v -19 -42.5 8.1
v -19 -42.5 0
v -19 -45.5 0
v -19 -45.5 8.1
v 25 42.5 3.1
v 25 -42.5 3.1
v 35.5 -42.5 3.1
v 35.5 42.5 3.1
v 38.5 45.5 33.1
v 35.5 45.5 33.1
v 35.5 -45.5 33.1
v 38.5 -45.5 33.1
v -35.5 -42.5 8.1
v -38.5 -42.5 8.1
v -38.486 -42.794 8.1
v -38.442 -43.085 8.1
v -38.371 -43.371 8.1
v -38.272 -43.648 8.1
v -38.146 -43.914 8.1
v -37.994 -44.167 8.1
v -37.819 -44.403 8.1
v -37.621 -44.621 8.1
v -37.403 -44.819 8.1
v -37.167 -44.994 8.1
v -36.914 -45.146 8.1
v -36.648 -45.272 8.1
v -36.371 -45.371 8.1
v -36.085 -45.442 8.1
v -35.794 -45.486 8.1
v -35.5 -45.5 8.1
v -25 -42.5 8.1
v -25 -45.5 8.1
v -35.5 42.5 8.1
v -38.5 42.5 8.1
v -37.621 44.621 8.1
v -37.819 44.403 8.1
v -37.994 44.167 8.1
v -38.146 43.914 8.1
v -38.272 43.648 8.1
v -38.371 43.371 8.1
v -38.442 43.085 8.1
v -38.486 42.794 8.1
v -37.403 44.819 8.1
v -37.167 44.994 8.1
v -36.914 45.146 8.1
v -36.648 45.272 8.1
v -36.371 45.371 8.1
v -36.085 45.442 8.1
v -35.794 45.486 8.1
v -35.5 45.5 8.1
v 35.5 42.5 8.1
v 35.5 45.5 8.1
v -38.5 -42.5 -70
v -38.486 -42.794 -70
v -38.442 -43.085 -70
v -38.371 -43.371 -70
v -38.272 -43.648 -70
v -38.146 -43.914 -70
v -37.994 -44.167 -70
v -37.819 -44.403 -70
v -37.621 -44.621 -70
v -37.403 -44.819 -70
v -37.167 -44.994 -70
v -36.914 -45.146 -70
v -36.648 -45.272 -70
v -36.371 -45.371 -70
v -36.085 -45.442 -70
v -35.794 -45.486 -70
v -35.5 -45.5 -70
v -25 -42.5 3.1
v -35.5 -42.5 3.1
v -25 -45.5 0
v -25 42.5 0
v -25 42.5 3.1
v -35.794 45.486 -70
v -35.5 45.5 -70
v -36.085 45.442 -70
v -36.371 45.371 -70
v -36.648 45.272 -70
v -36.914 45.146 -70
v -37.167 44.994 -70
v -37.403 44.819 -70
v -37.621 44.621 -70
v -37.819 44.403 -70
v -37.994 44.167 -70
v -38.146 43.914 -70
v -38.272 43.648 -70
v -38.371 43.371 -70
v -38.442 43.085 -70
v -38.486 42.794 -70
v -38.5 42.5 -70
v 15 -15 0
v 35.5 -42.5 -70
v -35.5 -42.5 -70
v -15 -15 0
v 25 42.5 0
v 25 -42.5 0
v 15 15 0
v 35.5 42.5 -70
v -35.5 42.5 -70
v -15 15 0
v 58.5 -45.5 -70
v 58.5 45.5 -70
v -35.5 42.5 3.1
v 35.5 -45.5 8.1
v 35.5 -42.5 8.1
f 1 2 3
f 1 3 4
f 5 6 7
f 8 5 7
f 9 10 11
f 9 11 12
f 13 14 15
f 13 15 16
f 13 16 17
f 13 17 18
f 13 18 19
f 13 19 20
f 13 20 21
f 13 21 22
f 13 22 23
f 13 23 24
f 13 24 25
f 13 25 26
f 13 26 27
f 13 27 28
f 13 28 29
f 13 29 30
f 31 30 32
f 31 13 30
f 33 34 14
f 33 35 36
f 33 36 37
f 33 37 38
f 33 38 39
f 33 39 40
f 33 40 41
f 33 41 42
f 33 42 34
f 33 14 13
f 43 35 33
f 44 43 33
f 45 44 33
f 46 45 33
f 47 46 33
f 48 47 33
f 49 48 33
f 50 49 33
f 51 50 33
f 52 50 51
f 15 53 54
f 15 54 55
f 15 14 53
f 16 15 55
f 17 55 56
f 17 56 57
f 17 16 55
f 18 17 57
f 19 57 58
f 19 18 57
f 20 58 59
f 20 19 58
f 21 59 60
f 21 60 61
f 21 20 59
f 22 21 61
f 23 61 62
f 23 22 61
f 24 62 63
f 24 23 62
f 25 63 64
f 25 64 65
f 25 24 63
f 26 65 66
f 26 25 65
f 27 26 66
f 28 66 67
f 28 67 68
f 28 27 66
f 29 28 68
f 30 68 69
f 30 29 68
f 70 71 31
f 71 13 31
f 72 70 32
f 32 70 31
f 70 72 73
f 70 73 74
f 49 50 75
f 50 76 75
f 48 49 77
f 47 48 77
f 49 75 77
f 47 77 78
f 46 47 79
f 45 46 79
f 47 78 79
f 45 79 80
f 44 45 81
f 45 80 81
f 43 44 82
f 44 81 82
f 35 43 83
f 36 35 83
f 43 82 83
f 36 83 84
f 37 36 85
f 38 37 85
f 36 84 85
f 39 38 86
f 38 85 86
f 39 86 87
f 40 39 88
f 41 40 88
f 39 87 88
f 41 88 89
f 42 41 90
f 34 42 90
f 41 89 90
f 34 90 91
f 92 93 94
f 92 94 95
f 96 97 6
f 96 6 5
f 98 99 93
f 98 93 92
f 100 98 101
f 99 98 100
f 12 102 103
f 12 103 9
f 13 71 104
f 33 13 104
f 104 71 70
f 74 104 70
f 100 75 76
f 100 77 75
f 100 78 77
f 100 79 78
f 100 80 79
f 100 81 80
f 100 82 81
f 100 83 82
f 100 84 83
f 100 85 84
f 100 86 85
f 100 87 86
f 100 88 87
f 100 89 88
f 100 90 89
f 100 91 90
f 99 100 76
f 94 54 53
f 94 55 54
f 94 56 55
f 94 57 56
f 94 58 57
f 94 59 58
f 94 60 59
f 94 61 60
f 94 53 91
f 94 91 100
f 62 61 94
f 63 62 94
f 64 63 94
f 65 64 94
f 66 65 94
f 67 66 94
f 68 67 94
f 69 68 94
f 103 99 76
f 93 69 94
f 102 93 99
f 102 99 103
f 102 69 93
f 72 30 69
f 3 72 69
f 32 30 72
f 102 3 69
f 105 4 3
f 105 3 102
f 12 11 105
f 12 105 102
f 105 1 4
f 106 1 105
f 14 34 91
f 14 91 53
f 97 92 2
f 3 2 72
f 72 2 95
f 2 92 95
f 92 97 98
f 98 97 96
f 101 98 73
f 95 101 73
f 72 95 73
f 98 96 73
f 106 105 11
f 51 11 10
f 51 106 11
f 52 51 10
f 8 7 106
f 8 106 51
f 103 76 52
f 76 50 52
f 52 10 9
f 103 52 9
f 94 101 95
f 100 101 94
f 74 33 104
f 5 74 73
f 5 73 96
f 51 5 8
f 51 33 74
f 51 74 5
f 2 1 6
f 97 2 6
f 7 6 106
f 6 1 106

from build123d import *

# Parameters (mm, degrees)
F0_W      = 77
F0_H      = 91
F0_W_2    = 50
F0_H_2    = 85
F1_DEPTH  = 3.1
F2_W      = 77
F2_H      = 91
F2_W_2    = 71
F2_H_2    = 85
F3_DEPTH  = 5
F4_W      = 3
F4_H      = 91
F5_DEPTH  = 25
F6_W      = 77
F6_H      = 91
F6_W_2    = 71
F6_H_2    = 85
F7_DEPTH  = 70
F9_DEPTH  = 91
F11_DEPTH = 77
F12_W     = 6
F12_H     = 8.1
F13_DEPTH = 4
F15_DEPTH = 91
F16_W     = 3
F16_H     = 91
F17_DEPTH = 25
F18_R     = 3


with BuildPart() as f1:
    # F0 (on Top) → F1 (new body)
    with BuildSketch(Plane.XY):
        Rectangle(F0_W, F0_H)
        Rectangle(F0_W_2, F0_H_2, mode=Mode.SUBTRACT)
    extrude(amount=F1_DEPTH)

    # F2 (on face) → F3 (join)
    with BuildSketch(Plane.XY.offset(3.1)):
        Rectangle(F2_W, F2_H)
        Rectangle(F2_W_2, F2_H_2, mode=Mode.SUBTRACT)
    extrude(amount=F3_DEPTH)

    # F4 (on face) → F5 (join)
    with BuildSketch(Plane.XY.offset(8.1)):
        with Locations((-37, 0)):
            Rectangle(F4_W, F4_H)
        with Locations((37, 0)):
            Rectangle(F4_W, F4_H)
    extrude(amount=F5_DEPTH)

    # F6 (on face) → F7 (join)
    with BuildSketch(Plane(origin=(0, 0, 0), x_dir=(1, 0, 0), z_dir=(0, 0, -1))):
        Rectangle(F6_W, F6_H)
        Rectangle(F6_W_2, F6_H_2, mode=Mode.SUBTRACT)
    extrude(amount=F7_DEPTH)

    # F8 (on face) → F9 (join)
    with BuildSketch(Plane(origin=(0, 45.5, 0), x_dir=(-1, 0, 0), z_dir=(0, 1, 0))):
        Polygon((38.5, -70), (38.5, 0), (15, 0), (35.5, -70), align=None)
        Polygon((-15, 0), (-38.5, 0), (-38.5, -70), (-35.5, -70), align=None)
    extrude(amount=-F9_DEPTH)

    # F10 (on face) → F11 (join)
    with BuildSketch(Plane.YZ.offset(38.5)):
        Polygon((45.5, -70), (45.5, 0), (15, 0), (42.5, -70), align=None)
        Polygon((-15, 0), (-45.5, 0), (-45.5, -70), (-42.5, -70), align=None)
    extrude(amount=-F11_DEPTH)

    # F12 (on face) → F13 (cut)
    with BuildSketch(Plane(origin=(0, -42.5, 0), x_dir=(-1, 0, 0), z_dir=(0, 1, 0))):
        with Locations((22, 4.05)):
            Rectangle(F12_W, F12_H)
    extrude(amount=-F13_DEPTH, mode=Mode.SUBTRACT)

    # F14 (on face) → F15 (join)
    with BuildSketch(Plane.XZ.offset(45.5)):
        Polygon((58.5, -70), (38.5, 33.1), (38.5, -70), align=None)
    extrude(amount=-F15_DEPTH)

    # F16 (on face) → F17 (cut)
    with BuildSketch(Plane.XY.offset(33.1)):
        with Locations((-37, 0)):
            Rectangle(F16_W, F16_H)
    extrude(amount=-F17_DEPTH, mode=Mode.SUBTRACT)

    # F18
    f18_edges = [f1.edges().sort_by_distance(p)[0] for p in [
        (-38.5, -45.5, -30.95),
        (-38.5, 45.5, -30.95),
    ]]
    fillet(f18_edges, radius=F18_R)


solid = f1.part
